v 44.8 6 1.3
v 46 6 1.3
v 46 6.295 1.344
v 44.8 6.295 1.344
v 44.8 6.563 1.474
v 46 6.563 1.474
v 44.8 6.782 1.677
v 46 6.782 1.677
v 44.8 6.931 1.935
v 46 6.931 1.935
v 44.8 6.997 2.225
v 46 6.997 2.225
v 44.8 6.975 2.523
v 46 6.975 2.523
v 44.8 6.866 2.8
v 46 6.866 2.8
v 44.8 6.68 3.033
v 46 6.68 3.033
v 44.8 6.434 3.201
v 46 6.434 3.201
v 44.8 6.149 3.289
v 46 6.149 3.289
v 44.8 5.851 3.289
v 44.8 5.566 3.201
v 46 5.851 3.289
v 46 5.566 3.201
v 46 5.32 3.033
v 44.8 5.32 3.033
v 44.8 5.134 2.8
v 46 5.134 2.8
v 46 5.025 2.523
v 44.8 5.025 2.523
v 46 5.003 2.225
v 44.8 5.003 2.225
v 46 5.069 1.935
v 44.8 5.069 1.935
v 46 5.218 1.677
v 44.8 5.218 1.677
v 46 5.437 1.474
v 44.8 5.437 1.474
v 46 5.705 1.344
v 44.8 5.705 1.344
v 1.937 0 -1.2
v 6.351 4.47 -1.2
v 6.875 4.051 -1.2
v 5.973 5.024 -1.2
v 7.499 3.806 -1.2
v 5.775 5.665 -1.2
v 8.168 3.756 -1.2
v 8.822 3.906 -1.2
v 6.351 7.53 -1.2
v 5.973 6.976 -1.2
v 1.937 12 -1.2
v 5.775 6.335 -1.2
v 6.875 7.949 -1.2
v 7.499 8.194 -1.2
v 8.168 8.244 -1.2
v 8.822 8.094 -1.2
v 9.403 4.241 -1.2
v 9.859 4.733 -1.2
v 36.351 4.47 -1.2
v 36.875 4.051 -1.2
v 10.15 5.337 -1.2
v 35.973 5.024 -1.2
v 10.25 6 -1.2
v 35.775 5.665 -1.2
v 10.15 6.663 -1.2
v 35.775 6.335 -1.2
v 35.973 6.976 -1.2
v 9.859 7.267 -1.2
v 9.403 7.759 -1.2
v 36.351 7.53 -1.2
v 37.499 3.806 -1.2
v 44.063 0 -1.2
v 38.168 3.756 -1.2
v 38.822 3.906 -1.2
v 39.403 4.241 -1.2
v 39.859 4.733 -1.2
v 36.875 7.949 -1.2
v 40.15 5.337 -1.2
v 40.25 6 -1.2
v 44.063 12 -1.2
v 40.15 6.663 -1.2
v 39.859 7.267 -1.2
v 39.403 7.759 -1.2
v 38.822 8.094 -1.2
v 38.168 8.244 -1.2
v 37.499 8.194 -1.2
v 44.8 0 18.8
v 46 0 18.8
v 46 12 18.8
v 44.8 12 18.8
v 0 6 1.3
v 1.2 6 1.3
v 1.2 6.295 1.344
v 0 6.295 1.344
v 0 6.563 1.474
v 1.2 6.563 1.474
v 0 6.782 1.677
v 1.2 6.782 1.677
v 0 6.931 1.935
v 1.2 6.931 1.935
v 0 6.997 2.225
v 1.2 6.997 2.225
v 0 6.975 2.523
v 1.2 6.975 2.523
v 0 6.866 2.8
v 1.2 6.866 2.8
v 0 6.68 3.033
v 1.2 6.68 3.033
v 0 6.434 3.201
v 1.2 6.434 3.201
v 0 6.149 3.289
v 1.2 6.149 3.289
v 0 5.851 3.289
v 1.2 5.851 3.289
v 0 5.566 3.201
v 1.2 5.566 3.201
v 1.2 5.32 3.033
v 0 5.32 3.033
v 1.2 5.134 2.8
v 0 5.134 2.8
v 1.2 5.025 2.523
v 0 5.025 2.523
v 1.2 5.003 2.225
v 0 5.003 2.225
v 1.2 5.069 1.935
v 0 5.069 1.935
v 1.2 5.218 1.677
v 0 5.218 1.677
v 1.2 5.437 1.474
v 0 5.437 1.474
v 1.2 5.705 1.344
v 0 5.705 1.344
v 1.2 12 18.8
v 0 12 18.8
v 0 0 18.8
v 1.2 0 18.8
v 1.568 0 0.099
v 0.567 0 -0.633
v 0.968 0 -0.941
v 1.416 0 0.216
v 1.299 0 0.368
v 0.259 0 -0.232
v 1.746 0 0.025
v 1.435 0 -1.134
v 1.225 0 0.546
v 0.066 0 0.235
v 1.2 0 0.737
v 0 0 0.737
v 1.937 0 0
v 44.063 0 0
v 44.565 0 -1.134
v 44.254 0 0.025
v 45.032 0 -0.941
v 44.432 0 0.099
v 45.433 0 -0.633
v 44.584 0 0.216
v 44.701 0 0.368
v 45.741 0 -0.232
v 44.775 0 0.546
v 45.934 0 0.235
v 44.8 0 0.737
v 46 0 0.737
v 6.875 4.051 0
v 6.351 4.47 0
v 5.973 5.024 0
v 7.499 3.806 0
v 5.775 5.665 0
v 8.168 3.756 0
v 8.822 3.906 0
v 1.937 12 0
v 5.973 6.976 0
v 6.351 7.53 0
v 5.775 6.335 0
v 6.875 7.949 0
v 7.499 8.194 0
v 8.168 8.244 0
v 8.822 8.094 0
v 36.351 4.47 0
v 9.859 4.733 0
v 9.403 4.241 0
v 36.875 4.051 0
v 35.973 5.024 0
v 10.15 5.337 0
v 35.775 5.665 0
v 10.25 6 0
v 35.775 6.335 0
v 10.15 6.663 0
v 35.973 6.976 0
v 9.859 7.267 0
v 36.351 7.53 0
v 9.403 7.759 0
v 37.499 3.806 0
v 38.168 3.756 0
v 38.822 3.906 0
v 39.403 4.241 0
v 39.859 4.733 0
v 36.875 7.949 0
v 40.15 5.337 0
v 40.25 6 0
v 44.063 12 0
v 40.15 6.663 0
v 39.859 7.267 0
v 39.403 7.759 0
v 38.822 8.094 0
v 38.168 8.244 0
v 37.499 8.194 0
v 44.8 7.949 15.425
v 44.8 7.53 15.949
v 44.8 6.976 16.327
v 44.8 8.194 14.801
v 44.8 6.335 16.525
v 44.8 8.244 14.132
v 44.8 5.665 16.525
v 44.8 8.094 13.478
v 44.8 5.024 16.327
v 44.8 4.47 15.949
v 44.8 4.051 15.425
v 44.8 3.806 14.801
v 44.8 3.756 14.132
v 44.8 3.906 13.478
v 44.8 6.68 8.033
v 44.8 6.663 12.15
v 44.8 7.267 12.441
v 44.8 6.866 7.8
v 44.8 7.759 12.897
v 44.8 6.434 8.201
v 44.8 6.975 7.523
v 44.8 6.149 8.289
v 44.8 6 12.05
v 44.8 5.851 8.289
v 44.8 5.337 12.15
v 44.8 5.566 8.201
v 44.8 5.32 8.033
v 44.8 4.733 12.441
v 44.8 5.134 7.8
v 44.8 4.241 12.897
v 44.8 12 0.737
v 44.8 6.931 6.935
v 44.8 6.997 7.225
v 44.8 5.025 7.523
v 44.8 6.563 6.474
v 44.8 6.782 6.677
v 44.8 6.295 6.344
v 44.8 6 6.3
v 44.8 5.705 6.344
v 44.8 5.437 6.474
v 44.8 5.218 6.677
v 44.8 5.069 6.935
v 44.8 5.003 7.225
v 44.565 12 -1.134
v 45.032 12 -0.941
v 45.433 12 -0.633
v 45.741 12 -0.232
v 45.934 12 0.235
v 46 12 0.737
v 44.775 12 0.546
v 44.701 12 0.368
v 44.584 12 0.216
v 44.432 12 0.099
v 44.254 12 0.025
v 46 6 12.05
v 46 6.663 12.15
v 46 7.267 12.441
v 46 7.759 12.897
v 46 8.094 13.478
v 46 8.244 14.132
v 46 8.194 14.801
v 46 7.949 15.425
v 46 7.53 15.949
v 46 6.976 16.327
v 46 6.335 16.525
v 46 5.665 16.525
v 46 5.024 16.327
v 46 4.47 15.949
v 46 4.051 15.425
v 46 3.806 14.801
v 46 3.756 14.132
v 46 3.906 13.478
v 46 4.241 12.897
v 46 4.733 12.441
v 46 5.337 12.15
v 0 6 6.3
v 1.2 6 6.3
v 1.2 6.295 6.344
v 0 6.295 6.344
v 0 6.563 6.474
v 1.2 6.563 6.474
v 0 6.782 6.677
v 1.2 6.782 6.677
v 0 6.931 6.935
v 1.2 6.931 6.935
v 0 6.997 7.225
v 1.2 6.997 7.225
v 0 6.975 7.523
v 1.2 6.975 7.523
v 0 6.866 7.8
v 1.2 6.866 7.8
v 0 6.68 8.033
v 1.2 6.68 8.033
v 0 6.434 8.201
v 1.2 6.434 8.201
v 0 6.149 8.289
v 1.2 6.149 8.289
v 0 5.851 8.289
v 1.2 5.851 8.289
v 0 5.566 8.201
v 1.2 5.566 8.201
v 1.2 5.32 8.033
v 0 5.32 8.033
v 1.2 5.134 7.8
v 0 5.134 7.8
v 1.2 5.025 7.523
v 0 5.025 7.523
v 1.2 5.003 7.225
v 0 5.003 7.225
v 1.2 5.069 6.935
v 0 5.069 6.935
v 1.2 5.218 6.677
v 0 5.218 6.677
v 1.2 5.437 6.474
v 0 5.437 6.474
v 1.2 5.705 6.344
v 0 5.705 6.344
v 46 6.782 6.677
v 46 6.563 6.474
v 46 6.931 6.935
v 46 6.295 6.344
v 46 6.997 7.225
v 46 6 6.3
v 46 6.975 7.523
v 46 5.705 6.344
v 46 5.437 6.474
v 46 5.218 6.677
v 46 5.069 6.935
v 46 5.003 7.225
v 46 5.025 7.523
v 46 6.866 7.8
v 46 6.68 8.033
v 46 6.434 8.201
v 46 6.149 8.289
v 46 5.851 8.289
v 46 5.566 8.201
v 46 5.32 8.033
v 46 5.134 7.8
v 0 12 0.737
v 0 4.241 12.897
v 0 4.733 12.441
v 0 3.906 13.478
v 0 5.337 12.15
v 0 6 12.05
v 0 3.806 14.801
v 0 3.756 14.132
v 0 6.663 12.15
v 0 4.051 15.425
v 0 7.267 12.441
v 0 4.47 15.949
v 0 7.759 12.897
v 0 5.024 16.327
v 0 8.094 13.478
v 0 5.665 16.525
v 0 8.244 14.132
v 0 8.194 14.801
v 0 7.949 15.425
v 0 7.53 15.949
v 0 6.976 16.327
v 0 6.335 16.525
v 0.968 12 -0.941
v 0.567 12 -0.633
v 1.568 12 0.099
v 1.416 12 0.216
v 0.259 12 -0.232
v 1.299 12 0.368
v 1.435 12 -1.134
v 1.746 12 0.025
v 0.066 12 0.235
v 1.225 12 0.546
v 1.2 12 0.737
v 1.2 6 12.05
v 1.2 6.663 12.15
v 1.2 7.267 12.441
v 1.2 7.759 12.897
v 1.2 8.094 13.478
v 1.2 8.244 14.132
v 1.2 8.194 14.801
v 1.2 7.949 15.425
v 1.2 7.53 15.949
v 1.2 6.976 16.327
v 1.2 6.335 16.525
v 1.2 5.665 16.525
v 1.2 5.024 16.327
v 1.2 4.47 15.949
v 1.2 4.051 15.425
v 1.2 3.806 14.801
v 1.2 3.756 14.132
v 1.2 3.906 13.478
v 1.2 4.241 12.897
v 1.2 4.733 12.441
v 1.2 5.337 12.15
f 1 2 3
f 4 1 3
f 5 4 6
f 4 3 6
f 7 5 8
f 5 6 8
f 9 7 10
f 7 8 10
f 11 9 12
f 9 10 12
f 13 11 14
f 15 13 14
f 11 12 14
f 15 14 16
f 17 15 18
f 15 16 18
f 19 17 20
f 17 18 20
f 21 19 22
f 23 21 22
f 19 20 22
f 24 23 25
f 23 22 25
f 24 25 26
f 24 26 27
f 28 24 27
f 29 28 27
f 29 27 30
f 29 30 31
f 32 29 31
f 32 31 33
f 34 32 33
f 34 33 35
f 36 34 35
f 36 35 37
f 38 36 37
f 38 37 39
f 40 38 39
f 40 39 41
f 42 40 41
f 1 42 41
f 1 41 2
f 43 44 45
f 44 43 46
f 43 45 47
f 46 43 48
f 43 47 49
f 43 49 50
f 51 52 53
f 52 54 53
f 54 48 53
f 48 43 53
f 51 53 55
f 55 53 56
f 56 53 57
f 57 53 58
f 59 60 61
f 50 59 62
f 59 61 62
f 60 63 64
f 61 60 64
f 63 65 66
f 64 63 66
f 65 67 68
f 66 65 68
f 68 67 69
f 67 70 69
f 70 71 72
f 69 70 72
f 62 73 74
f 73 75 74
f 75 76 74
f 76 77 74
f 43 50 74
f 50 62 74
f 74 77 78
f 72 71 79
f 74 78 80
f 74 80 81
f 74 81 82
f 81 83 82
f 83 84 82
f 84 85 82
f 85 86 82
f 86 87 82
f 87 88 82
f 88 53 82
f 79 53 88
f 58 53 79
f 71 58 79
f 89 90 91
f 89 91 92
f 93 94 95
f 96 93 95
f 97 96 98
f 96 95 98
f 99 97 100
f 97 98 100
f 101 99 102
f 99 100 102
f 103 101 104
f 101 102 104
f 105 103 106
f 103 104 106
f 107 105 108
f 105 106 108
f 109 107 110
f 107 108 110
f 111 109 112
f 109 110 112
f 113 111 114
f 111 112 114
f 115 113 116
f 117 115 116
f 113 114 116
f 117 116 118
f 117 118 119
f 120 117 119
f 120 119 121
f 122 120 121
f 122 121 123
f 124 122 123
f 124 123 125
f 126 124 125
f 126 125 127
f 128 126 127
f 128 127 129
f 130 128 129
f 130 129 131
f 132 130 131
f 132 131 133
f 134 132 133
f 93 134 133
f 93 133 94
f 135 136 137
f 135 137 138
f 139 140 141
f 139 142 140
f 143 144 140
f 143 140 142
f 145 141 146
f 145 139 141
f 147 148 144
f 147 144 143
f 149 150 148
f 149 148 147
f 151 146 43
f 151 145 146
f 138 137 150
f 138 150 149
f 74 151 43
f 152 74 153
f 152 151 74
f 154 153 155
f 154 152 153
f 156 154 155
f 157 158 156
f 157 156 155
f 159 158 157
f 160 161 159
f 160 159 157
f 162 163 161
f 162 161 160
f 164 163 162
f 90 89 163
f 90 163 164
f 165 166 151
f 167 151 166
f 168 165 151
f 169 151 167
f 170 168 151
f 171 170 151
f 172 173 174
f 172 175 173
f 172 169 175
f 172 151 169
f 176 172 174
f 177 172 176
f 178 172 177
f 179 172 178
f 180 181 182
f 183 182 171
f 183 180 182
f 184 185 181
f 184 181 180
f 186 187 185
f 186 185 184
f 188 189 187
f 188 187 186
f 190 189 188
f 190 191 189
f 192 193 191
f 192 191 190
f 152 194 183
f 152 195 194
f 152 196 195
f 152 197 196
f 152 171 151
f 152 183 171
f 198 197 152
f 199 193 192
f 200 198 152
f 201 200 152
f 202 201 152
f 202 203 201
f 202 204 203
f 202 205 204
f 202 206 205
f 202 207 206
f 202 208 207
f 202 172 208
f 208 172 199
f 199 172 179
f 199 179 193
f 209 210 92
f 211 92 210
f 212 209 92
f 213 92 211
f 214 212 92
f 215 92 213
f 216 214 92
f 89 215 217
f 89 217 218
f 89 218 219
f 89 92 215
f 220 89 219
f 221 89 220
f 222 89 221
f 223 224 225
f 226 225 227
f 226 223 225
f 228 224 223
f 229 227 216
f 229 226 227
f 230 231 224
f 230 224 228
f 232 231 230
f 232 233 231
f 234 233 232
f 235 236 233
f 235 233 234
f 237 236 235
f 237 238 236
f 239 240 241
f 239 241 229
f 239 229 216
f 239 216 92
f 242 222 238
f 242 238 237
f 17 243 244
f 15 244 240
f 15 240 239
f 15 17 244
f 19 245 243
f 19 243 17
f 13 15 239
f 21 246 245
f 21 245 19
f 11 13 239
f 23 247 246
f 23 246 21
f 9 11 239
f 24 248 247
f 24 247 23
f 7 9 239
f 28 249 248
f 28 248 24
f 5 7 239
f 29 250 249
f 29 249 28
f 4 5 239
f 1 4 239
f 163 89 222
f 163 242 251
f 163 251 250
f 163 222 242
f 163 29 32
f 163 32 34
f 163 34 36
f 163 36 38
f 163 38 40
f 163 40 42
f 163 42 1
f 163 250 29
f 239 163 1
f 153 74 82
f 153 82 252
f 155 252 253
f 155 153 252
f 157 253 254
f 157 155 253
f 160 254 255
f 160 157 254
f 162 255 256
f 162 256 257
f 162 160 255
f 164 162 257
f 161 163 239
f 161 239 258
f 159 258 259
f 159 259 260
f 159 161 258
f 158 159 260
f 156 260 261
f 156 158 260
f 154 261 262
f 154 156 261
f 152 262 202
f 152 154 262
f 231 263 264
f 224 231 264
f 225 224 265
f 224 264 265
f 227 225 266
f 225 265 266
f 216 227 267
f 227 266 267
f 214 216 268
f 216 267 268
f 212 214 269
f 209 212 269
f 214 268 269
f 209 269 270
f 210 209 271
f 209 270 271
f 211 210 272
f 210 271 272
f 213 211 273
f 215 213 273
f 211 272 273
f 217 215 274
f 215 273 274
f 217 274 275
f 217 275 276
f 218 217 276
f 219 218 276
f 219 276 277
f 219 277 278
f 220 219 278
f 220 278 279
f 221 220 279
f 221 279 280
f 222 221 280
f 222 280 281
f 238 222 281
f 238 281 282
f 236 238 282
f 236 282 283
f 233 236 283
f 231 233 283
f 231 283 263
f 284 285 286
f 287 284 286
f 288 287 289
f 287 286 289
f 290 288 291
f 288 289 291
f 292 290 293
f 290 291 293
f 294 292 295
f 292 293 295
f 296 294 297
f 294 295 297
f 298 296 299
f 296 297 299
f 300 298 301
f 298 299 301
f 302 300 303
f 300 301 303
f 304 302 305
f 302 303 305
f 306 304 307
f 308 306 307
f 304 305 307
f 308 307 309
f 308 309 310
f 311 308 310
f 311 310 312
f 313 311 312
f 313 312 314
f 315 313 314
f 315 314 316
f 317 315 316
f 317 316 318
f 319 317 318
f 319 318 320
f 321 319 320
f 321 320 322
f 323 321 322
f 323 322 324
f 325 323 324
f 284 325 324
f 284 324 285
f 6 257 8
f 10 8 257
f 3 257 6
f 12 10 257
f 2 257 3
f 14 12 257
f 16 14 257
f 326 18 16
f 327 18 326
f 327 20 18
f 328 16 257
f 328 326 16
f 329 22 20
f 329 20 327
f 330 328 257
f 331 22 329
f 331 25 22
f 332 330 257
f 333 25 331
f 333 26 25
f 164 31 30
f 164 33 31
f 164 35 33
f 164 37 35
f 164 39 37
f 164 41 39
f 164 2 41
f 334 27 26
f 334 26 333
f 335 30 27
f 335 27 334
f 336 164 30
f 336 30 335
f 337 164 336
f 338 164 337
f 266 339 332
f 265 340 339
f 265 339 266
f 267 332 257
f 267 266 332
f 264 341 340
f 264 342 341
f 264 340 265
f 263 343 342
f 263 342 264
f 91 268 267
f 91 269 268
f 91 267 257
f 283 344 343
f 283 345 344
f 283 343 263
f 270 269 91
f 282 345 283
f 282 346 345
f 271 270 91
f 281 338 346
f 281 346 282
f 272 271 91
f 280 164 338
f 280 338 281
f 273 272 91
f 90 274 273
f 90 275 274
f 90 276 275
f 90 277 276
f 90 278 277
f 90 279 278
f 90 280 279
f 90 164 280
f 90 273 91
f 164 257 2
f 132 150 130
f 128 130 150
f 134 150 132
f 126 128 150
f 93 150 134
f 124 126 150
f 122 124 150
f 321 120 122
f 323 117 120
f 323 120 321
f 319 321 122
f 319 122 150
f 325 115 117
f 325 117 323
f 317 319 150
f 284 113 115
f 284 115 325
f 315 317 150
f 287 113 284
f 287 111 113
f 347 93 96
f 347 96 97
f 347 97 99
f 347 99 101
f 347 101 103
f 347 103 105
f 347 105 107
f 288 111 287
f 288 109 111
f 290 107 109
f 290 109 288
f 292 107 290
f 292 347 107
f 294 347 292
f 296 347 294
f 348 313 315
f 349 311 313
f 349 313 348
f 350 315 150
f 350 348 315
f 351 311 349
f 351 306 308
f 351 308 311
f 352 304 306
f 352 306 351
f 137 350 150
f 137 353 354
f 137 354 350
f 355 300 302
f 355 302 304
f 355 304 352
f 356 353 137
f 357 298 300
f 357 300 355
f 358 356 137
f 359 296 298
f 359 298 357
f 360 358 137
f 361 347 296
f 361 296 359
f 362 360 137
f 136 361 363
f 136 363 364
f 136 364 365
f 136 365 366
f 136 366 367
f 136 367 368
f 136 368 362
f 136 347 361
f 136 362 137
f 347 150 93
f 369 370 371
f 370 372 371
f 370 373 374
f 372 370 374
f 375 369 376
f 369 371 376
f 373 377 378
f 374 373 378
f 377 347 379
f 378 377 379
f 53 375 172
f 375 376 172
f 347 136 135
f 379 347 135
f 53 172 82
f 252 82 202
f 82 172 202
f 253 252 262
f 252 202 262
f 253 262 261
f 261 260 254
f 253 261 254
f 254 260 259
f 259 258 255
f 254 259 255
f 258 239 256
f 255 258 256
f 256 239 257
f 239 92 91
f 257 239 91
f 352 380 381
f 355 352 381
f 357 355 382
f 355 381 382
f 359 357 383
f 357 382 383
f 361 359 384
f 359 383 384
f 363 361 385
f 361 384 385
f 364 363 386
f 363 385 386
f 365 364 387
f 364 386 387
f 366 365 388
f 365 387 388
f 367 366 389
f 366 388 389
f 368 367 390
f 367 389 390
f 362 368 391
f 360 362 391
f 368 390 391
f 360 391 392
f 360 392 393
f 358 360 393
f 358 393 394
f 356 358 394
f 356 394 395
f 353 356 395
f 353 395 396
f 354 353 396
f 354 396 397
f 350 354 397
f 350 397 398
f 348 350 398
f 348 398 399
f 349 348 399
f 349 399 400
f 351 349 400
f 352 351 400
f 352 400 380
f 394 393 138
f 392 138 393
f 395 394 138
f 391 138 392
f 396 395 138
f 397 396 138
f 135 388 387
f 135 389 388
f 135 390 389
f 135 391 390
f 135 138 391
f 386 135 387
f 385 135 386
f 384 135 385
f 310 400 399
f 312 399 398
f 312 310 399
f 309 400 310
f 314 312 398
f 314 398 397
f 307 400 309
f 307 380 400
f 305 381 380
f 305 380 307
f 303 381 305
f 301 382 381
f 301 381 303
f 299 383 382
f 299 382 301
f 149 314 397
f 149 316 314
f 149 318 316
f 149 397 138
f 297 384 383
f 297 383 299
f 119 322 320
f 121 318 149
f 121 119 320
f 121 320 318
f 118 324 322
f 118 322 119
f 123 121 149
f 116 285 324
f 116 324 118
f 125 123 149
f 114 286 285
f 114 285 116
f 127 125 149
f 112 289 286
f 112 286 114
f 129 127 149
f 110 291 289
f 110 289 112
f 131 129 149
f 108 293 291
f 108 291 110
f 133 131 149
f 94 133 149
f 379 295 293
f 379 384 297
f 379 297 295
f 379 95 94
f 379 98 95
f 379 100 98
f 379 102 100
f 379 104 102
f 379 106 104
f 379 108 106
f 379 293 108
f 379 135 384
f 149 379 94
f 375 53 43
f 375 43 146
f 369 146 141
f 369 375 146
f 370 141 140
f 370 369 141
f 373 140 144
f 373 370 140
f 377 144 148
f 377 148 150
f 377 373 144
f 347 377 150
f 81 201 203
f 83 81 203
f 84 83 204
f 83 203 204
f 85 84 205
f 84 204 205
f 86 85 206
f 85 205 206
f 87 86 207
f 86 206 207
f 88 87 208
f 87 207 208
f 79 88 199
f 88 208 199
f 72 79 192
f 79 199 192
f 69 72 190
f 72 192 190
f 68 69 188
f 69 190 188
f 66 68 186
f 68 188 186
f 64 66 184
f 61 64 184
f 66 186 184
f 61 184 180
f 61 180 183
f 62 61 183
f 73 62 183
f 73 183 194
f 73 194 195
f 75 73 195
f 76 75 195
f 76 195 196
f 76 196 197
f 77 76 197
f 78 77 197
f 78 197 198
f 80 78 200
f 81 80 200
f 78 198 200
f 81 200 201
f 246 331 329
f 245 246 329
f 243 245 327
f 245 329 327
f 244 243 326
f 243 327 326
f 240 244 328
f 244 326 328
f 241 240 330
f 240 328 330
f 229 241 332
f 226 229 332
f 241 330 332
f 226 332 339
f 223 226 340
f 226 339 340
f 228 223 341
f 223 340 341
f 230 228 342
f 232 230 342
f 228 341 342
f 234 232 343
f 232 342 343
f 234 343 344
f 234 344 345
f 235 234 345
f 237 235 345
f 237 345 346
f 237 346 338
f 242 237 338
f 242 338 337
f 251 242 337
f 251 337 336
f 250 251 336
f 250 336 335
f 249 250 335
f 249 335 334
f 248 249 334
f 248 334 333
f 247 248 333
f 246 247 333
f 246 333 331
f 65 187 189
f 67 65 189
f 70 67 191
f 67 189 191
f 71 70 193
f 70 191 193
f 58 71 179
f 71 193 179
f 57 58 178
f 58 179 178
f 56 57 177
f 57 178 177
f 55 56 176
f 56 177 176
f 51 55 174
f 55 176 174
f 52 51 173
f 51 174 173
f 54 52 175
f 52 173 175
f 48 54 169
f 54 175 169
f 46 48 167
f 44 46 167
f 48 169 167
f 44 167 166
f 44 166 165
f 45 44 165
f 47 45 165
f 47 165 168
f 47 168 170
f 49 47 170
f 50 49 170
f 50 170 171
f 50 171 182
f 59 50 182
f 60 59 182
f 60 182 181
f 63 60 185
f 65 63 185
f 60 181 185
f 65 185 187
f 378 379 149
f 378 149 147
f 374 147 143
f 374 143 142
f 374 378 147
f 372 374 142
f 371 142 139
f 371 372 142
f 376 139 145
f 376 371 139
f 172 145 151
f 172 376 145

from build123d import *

# Parameters (mm, degrees)
SKETCH_1_W                         = 46
SKETCH_1_H                         = 12
SKETCH_1_R                         = 2.25
SM_BASE_FLANGE_1_DEPTH             = 1.2
SM_EDGE_FLANGE_1_STRIP_W           = 6.2732
SM_EDGE_FLANGE_1_STRIP_H           = 1.2
SM_EDGE_FLANGE_1_STRIP_CUT_DEPTH   = 12
SM_EDGE_FLANGE_1_STRIP_2_W         = 6.2732
SM_EDGE_FLANGE_1_STRIP_2_H         = 1.2
SM_EDGE_FLANGE_1_STRIP_CUT_2_DEPTH = 12
SM_EDGE_FLANGE_1_DEPTH             = 12
SM_EDGE_FLANGE_1_BEND_DEPTH        = 12
SKETCH_12_R                        = 2.25
SKETCH_12_R_2                      = 1
CUT_EXTRUDE_1_DEPTH                = 52.121815304


# Sheet-metal steps are written as plain solids
with BuildPart() as part:
    # Sketch 1 → Базовая кромка1 (new body)
    with BuildSketch(Plane.XY):
        with Locations((23, 6)):
            Rectangle(SKETCH_1_W, SKETCH_1_H)
        with Locations((8, 6)):
            Circle(SKETCH_1_R, mode=Mode.SUBTRACT)
        with Locations((38, 6)):
            Circle(SKETCH_1_R, mode=Mode.SUBTRACT)
    extrude(amount=-SM_BASE_FLANGE_1_DEPTH)

    # Ребро-кромка1 strip (across the edge) → Ребро-кромка1 strip cut (cut)
    with BuildSketch(Plane.XZ.offset(-12)):
        with Locations((-1.2, -0.6)):
            Rectangle(SM_EDGE_FLANGE_1_STRIP_W, SM_EDGE_FLANGE_1_STRIP_H)
    extrude(amount=SM_EDGE_FLANGE_1_STRIP_CUT_DEPTH, mode=Mode.SUBTRACT)

    # Ребро-кромка1 strip 2 (across the edge) → Ребро-кромка1 strip cut 2 (cut)
    with BuildSketch(Plane(origin=(46, 0, 0), x_dir=(-1, 0, 0), z_dir=(0, 1, 0))):
        with Locations((-1.2, -0.6)):
            Rectangle(SM_EDGE_FLANGE_1_STRIP_2_W, SM_EDGE_FLANGE_1_STRIP_2_H)
    extrude(amount=SM_EDGE_FLANGE_1_STRIP_CUT_2_DEPTH, mode=Mode.SUBTRACT)

    # Ребро-кромка1 section (across the edge) → Ребро-кромка1 (add)
    with BuildSketch(Plane.XZ.offset(-12)):
        with BuildLine():
            Line((0, 0.7366), (0, 18.8))
            Line((0, 18.8), (1.2, 18.8))
            Line((1.2, 18.8), (1.2, 0.7366))
            ThreePointArc((1.2, 0.7366), (1.415745145, 0.215745145), (1.9366, 0))
            Line((1.9366, 0), (1.9366, -1.2))
            ThreePointArc((1.9366, -1.2), (0.567217008, -0.632782992), (0, 0.7366))
        make_face()
    extrude(amount=SM_EDGE_FLANGE_1_DEPTH)

    # Ребро-кромка1 section 2 (across the edge) → Ребро-кромка1 bend (add)
    with BuildSketch(Plane(origin=(46, 0, 0), x_dir=(-1, 0, 0), z_dir=(0, 1, 0))):
        with BuildLine():
            Line((0, 0.7366), (0, 18.8))
            Line((0, 18.8), (1.2, 18.8))
            Line((1.2, 18.8), (1.2, 0.7366))
            ThreePointArc((1.2, 0.7366), (1.415745145, 0.215745145), (1.9366, 0))
            Line((1.9366, 0), (1.9366, -1.2))
            ThreePointArc((1.9366, -1.2), (0.567217008, -0.632782992), (0, 0.7366))
        make_face()
    extrude(amount=SM_EDGE_FLANGE_1_BEND_DEPTH)

    # Эскиз12 → Вырез-Вытянуть1 (cut, through all)
    with BuildSketch(Plane(origin=(46, 0, 0), x_dir=(0, 0, -1), z_dir=(1, 0, 0))):
        with Locations((-14.3, 6)):
            Circle(SKETCH_12_R)
        with Locations((-7.3, 6)):
            Circle(SKETCH_12_R_2)
        with Locations((-2.3, 6)):
            Circle(SKETCH_12_R_2)
    extrude(amount=-CUT_EXTRUDE_1_DEPTH, mode=Mode.SUBTRACT)


solid = part.part
